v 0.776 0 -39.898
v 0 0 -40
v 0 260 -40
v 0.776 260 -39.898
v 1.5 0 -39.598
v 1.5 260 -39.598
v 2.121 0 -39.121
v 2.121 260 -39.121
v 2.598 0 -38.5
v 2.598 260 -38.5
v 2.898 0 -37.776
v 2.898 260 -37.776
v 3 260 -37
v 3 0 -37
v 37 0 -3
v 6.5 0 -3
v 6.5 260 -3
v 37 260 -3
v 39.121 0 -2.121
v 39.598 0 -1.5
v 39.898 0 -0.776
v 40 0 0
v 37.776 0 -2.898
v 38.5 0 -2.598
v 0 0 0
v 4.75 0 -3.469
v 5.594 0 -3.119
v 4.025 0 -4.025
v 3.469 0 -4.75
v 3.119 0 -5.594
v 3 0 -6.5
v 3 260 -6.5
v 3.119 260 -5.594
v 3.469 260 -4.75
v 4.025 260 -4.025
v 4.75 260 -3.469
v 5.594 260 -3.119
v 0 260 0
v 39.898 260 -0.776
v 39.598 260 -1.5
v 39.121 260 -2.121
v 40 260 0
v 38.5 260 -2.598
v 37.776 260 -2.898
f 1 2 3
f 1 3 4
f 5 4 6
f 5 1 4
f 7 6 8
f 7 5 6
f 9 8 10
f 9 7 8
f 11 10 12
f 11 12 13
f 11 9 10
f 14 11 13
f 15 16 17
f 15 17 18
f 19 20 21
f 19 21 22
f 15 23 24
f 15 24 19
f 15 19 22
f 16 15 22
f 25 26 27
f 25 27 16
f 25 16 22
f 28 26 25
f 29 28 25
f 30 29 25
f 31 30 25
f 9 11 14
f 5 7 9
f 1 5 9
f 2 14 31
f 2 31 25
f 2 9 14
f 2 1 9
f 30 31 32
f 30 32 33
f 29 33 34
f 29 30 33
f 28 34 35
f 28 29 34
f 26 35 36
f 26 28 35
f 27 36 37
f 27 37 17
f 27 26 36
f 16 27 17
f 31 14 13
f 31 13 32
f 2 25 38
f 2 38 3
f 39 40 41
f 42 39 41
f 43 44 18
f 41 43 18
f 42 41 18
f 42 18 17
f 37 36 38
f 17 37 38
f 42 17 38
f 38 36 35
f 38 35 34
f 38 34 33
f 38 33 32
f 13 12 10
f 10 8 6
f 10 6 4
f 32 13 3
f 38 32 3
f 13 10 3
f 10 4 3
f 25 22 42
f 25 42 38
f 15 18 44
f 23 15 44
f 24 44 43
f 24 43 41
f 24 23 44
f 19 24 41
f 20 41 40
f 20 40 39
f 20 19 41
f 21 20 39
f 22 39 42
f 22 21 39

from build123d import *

# Parameters (mm, degrees)
IRON_V40X40X3_1_DEPTH = 260


with BuildPart() as part:
    # Sketch1 → Iron V40X40X3(1) (new body)
    with BuildSketch(Plane(origin=(0, 0, 0), x_dir=(1, 0, 0), z_dir=(0, 1, 0))):
        with BuildLine():
            Line((0, 0), (0, 40))
            ThreePointArc((0, 40), (2.121320344, 39.121320344), (3, 37))
            Line((3, 37), (3, 6.5))
            ThreePointArc((3, 6.5), (4.025126266, 4.025126266), (6.5, 3))
            Line((6.5, 3), (37, 3))
            ThreePointArc((37, 3), (39.121320344, 2.121320344), (40, 0))
            Line((40, 0), (0, 0))
        make_face()
    extrude(amount=IRON_V40X40X3_1_DEPTH)


solid = part.part
